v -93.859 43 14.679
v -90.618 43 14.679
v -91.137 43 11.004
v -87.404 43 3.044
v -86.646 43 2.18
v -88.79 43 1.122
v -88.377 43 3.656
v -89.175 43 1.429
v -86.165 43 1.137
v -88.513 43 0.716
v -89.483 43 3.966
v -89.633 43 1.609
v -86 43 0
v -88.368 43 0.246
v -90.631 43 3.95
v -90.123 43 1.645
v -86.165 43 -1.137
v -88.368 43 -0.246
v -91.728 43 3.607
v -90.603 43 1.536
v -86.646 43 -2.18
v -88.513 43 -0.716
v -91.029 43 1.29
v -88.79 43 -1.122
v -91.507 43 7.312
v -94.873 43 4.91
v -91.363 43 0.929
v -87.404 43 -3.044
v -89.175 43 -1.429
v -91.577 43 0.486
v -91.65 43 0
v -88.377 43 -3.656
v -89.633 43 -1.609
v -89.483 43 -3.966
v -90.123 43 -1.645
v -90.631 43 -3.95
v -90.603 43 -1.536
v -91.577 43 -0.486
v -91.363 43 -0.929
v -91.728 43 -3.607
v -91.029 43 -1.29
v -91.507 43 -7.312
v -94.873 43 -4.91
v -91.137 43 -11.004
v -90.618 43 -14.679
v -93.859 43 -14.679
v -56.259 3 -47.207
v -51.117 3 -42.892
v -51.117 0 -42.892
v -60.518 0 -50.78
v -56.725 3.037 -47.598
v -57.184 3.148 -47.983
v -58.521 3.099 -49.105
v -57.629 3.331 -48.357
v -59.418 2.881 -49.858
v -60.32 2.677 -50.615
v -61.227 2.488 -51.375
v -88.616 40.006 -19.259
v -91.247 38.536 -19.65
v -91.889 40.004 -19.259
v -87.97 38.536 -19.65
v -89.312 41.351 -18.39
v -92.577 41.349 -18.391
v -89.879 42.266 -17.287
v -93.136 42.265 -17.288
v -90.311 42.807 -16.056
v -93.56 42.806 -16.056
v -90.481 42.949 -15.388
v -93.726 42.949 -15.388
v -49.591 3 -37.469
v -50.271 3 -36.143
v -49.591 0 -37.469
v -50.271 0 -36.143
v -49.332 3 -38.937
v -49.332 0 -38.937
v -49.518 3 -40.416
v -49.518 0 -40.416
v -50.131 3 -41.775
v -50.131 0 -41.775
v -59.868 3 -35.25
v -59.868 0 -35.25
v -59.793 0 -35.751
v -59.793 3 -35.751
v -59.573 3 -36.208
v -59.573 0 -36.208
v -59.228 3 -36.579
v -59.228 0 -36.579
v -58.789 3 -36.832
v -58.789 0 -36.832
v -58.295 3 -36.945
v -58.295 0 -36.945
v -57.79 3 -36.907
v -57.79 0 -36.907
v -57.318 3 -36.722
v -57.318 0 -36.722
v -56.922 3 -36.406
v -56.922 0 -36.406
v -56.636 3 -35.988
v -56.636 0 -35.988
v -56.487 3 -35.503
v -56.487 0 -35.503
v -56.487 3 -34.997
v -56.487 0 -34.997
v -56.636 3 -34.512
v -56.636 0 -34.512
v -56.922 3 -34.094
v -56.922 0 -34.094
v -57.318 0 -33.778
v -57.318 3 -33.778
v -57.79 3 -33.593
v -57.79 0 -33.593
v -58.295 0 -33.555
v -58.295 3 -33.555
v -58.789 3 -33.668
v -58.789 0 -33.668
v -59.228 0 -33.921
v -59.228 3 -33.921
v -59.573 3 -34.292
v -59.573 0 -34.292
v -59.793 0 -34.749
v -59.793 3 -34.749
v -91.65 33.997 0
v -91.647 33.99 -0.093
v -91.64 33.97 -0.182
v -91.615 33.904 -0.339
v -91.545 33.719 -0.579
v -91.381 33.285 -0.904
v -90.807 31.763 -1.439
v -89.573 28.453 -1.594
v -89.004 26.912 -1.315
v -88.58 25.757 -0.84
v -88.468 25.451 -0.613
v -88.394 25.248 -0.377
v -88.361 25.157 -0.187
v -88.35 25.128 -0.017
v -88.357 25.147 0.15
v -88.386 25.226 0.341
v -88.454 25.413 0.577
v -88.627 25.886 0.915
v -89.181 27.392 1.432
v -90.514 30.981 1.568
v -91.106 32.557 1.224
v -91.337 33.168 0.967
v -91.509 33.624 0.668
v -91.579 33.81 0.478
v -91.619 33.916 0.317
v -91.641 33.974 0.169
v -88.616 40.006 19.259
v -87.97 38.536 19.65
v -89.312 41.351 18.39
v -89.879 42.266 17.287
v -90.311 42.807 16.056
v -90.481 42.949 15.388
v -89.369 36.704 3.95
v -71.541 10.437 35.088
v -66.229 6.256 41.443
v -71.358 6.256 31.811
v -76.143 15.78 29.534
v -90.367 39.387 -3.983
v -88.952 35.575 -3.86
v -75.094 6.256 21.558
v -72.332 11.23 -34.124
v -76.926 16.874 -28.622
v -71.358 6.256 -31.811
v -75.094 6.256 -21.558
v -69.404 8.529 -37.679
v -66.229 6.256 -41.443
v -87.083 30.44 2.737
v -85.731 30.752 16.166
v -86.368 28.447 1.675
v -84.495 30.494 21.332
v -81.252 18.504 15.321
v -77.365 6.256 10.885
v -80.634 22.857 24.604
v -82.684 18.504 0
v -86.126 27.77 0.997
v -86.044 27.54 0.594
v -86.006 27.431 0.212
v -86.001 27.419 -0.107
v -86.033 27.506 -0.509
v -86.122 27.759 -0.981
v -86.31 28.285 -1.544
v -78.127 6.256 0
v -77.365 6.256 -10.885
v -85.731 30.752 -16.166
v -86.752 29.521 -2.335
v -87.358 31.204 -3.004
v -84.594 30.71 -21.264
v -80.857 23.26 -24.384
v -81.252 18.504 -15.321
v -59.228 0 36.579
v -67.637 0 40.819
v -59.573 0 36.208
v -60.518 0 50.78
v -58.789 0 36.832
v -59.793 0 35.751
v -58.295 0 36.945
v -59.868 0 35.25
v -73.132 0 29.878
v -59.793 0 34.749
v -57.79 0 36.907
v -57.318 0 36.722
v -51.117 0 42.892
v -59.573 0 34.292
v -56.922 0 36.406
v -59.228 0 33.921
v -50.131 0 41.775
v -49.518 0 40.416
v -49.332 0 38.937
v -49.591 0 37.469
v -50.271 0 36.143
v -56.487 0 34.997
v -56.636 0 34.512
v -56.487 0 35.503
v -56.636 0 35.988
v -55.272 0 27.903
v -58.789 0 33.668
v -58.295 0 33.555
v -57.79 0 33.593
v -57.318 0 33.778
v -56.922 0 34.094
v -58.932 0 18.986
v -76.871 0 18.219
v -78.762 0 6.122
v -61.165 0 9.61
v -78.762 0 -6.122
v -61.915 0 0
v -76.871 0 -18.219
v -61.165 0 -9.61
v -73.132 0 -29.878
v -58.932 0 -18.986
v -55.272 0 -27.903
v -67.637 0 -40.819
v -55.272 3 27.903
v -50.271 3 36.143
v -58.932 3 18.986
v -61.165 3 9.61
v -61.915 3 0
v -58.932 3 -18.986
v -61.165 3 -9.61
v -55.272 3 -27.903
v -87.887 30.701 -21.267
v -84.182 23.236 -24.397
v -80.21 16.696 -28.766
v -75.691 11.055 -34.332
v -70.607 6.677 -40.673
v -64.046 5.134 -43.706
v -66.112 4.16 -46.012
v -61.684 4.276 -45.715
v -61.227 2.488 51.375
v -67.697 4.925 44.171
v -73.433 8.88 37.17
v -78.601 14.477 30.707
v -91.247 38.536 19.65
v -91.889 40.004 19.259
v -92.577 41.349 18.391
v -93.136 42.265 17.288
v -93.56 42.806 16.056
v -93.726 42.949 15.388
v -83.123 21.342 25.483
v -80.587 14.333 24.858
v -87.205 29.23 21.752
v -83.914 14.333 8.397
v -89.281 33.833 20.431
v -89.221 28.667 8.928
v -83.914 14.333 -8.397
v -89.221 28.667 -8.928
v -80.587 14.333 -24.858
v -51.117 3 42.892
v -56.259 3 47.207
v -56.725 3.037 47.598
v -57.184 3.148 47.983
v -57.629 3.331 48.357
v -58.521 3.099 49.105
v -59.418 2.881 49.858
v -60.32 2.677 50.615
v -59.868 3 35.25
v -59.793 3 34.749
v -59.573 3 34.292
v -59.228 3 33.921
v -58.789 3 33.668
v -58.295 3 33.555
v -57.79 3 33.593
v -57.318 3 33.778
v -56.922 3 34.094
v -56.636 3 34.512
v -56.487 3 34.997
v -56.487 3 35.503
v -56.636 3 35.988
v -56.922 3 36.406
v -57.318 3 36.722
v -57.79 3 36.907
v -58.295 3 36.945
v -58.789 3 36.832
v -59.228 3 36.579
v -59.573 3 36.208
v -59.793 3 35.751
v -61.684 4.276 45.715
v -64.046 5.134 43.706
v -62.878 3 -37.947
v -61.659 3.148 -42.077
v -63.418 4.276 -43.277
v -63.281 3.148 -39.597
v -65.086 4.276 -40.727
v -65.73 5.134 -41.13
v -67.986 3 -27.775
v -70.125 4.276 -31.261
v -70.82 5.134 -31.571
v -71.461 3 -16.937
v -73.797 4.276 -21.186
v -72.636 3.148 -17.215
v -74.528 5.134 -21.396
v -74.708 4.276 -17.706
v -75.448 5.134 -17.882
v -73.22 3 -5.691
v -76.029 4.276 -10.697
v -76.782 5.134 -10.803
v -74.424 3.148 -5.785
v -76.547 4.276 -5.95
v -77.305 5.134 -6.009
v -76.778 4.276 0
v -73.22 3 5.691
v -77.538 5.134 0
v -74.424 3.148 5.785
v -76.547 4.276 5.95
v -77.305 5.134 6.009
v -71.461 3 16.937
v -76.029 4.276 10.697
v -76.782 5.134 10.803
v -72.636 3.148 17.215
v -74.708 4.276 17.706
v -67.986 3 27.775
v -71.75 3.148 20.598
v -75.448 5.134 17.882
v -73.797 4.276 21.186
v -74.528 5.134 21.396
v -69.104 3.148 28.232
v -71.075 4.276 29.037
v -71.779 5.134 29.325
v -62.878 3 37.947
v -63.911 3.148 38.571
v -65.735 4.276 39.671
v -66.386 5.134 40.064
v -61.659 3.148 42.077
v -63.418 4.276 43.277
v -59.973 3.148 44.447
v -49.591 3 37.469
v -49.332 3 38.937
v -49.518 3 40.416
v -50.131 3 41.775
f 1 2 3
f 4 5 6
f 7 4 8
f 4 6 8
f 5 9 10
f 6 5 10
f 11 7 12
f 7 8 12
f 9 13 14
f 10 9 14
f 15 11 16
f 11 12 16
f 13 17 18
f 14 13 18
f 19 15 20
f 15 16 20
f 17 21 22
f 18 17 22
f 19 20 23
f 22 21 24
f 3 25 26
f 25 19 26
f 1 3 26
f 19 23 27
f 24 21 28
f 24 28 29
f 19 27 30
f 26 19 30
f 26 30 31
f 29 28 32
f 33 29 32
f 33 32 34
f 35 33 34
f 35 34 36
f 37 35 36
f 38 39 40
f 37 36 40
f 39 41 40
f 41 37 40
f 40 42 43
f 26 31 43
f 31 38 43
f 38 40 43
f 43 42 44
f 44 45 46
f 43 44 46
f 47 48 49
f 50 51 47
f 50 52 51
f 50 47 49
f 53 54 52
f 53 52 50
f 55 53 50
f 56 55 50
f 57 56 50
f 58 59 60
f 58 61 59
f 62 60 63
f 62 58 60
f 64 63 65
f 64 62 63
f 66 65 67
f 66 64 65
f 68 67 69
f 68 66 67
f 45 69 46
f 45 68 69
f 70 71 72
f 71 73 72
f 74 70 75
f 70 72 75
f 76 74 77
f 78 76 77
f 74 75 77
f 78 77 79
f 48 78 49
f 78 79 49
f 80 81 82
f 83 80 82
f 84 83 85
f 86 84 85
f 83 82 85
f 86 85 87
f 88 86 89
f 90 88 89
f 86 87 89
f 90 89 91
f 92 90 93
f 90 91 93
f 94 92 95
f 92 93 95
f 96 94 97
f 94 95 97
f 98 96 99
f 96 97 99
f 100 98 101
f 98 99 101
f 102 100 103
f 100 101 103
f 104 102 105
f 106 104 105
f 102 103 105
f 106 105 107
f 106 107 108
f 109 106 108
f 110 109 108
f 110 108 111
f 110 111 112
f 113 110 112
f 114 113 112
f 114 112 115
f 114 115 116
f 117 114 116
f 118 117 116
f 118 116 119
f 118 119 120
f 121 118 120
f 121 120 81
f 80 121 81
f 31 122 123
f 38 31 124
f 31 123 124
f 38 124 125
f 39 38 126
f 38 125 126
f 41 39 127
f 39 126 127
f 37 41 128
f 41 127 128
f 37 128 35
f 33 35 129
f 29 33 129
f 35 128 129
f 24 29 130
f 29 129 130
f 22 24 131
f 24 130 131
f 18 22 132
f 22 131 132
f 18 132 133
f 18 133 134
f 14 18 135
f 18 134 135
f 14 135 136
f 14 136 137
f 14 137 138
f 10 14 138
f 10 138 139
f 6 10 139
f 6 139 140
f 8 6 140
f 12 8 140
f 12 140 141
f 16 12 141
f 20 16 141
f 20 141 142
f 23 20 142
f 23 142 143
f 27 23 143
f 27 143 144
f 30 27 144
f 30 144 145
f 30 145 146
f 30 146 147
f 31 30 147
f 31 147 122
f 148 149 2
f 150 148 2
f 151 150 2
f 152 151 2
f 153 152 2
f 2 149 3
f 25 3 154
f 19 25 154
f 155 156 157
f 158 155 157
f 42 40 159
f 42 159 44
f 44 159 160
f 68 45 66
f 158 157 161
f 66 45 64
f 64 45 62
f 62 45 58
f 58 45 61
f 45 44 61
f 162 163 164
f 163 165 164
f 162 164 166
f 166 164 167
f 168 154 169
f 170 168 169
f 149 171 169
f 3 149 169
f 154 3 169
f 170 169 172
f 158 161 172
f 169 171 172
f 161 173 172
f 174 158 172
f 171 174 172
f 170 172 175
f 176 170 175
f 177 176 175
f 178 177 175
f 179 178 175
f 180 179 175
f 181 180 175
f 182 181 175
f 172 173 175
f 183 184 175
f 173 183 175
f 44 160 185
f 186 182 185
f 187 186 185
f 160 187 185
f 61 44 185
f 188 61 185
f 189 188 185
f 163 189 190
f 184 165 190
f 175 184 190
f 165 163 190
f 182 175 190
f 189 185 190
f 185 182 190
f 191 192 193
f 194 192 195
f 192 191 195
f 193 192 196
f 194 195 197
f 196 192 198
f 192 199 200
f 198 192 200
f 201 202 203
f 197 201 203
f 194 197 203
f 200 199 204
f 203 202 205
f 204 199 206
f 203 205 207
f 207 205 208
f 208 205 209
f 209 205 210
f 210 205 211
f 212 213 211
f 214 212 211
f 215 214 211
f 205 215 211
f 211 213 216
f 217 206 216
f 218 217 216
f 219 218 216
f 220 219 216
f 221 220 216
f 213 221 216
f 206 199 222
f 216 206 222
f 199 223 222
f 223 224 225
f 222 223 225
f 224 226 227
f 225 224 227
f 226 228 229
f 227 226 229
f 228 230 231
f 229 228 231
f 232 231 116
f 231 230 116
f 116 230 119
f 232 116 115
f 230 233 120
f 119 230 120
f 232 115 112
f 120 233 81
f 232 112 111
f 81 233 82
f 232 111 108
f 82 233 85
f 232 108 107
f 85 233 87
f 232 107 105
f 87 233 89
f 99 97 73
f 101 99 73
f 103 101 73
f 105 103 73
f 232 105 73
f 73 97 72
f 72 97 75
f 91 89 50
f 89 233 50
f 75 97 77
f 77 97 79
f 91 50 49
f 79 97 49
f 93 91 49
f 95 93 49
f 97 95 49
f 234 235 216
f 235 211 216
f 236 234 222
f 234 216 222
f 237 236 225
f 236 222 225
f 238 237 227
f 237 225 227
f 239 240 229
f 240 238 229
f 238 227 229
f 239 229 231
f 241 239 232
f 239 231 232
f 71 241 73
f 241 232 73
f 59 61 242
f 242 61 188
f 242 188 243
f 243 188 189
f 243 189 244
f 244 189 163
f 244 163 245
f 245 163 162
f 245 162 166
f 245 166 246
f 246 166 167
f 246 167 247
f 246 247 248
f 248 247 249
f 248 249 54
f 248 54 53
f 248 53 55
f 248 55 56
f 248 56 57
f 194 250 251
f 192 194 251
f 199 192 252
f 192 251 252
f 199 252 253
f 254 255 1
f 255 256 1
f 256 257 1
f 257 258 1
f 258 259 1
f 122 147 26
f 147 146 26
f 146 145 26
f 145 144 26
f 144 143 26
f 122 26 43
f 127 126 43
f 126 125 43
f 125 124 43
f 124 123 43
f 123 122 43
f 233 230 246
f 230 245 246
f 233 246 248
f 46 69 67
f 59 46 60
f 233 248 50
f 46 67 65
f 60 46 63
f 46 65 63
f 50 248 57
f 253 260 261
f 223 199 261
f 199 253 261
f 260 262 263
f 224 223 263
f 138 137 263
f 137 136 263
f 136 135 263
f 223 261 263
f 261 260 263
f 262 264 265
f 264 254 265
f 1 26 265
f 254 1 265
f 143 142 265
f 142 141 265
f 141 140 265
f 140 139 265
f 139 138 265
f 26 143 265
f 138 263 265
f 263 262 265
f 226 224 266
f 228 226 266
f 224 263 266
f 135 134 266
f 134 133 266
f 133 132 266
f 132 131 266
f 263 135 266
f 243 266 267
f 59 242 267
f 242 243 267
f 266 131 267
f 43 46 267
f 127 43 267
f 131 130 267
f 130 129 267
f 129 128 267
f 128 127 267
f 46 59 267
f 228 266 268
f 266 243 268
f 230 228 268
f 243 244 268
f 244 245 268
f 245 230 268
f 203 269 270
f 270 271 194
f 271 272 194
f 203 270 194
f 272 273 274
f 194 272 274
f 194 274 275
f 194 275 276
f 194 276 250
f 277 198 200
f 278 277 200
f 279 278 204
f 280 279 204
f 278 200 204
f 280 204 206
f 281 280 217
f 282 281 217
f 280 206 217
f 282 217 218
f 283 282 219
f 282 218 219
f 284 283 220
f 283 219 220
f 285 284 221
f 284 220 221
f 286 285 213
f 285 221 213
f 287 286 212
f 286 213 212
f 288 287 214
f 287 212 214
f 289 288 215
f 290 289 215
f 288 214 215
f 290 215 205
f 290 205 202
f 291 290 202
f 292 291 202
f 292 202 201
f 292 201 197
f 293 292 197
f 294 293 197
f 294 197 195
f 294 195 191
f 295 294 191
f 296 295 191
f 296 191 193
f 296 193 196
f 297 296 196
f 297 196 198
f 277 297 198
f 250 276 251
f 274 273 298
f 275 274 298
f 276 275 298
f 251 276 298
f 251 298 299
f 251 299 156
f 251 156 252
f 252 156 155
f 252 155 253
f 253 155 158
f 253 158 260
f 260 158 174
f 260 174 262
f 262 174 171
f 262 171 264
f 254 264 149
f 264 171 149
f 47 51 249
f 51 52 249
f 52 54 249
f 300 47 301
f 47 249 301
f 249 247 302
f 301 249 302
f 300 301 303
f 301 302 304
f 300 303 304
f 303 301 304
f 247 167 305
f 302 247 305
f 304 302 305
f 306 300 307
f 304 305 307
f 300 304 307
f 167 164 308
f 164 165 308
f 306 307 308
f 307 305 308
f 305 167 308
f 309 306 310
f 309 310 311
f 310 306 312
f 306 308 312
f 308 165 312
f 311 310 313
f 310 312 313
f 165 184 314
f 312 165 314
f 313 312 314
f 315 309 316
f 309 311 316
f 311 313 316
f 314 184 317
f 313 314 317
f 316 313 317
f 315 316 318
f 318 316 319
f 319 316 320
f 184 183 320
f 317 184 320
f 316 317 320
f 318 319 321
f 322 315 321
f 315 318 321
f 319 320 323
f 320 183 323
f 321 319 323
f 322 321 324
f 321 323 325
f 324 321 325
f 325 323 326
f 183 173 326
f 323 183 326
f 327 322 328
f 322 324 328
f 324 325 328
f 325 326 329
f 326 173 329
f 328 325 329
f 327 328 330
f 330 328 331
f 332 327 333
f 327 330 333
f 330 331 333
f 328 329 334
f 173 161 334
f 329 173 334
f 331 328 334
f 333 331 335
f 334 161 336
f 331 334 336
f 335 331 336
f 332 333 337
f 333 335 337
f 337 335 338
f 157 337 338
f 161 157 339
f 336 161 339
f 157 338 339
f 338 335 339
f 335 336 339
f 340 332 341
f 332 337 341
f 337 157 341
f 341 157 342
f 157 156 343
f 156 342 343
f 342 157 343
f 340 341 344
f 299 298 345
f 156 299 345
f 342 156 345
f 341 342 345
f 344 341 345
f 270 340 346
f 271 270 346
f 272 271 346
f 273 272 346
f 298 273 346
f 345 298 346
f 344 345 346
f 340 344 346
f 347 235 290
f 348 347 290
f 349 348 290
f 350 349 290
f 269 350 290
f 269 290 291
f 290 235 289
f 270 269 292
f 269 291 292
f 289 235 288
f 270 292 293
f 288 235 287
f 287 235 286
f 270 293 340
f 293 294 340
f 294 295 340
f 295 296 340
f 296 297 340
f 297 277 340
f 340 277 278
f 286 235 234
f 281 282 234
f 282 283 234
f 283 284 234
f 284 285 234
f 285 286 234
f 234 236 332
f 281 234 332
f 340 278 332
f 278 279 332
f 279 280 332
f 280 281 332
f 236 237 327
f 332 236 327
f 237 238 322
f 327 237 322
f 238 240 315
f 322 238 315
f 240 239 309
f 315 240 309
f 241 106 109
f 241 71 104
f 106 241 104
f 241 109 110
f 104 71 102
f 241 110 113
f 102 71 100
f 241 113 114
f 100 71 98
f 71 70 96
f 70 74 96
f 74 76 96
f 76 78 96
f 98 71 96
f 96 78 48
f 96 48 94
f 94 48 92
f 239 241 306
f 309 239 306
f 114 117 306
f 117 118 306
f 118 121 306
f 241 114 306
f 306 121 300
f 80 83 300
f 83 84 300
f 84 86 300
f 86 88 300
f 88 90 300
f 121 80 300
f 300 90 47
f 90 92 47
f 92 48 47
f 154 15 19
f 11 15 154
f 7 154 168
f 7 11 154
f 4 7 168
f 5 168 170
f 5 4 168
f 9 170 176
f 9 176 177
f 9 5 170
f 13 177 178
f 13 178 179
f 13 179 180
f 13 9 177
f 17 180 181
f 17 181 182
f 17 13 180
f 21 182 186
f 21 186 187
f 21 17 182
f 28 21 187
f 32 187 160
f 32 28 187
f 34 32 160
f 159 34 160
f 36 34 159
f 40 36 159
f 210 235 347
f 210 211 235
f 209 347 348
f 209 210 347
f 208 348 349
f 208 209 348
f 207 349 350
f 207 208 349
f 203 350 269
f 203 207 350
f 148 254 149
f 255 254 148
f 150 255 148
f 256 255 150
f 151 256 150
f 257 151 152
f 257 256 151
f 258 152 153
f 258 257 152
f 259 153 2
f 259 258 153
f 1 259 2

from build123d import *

# Parameters (mm, degrees)
R_VOLUTION1_ANGLE                         = 80
BOSS_EXTRU_1_REACH                        = 122.843
ESQUISSE3_R                               = 4
TROU_POUR_TARAUDAGE_POUR_TROU_TARAUD_M4_D = 3.3
D_GAGEMENT_M31_D                          = 3.4
ESQUISSE8_R                               = 41.654908191
ENL_V_MAT_EXTRU_1_DEPTH                   = 121.842511717
CONG_1_R                                  = 5


with BuildPart() as part:
    # Esquisse1 → Révolution1 (revolve, symmetric)
    with BuildSketch(Plane.XY) as r_volution1_sk:
        Polygon((-61.915329373, 0), (-79, 0), (-95, 43), (-91.799050303, 43), (-76.915329373, 3), (-61.915329373, 3), align=None)
    revolve(axis=Axis((0, 0, 0), (0, 1, 0)), revolution_arc=R_VOLUTION1_ANGLE / 2)
    revolve(r_volution1_sk.sketch, axis=Axis((0, 0, 0), (0, -1, 0)), revolution_arc=R_VOLUTION1_ANGLE / 2)

    # Esquisse3 → Boss.-Extru.1 (add, up to next)
    with BuildSketch(Plane(origin=(0, 43, 0), x_dir=(1, 0, 0), z_dir=(0, 1, 0)), mode=Mode.PRIVATE) as boss_extru_1_sk1:
        with Locations((-90, 0)):
            Circle(ESQUISSE3_R)
    boss_extru_1_tool1 = extrude(boss_extru_1_sk1.sketch, amount=-BOSS_EXTRU_1_REACH, mode=Mode.PRIVATE) - part.part
    add(boss_extru_1_tool1.solids().sort_by_distance((-90, 43, 0))[0])

    # Trou pour taraudage pour trou taraudé M41 (through all)
    with Locations(Plane(origin=(0, 43, 0), x_dir=(1, 0, 0), z_dir=(0, 1, 0))):
        with Locations((-90, 0)):
            Hole(TROU_POUR_TARAUDAGE_POUR_TROU_TARAUD_M4_D / 2)

    # Dégagement M31 (through all)
    with Locations(Plane(origin=(0, 3, 0), x_dir=(1, 0, 0), z_dir=(0, 1, 0))):
        with Locations((-58.168039621, 35.25), (-58.168039621, -35.25)):
            Hole(D_GAGEMENT_M31_D / 2)

    # Esquisse8 → Enlèv. mat.-Extru.1 (cut, through all)
    with BuildSketch(Plane(origin=(0, 0, 0), x_dir=(0, 0, -1), z_dir=(1, 0, 0))):
        with Locations((-61.06482292, 43)):
            Circle(ESQUISSE8_R)
        with Locations((61.06482292, 43)):
            Circle(ESQUISSE8_R)
    extrude(amount=-ENL_V_MAT_EXTRU_1_DEPTH, mode=Mode.SUBTRACT)

    # Congé1
    cong_1_edges = [part.edges().sort_by_distance(p)[0] for p in [
        (-76.915329373, 3, 0),
        (-91.359787942, 43, -19.409914729),
        (-91.359787942, 43, 19.409914729),
        (-47.42989401, 1.5, -39.798406571),
        (-47.42989401, 1.5, 39.798406571),
    ]]
    fillet(cong_1_edges, radius=CONG_1_R)


solid = part.part
